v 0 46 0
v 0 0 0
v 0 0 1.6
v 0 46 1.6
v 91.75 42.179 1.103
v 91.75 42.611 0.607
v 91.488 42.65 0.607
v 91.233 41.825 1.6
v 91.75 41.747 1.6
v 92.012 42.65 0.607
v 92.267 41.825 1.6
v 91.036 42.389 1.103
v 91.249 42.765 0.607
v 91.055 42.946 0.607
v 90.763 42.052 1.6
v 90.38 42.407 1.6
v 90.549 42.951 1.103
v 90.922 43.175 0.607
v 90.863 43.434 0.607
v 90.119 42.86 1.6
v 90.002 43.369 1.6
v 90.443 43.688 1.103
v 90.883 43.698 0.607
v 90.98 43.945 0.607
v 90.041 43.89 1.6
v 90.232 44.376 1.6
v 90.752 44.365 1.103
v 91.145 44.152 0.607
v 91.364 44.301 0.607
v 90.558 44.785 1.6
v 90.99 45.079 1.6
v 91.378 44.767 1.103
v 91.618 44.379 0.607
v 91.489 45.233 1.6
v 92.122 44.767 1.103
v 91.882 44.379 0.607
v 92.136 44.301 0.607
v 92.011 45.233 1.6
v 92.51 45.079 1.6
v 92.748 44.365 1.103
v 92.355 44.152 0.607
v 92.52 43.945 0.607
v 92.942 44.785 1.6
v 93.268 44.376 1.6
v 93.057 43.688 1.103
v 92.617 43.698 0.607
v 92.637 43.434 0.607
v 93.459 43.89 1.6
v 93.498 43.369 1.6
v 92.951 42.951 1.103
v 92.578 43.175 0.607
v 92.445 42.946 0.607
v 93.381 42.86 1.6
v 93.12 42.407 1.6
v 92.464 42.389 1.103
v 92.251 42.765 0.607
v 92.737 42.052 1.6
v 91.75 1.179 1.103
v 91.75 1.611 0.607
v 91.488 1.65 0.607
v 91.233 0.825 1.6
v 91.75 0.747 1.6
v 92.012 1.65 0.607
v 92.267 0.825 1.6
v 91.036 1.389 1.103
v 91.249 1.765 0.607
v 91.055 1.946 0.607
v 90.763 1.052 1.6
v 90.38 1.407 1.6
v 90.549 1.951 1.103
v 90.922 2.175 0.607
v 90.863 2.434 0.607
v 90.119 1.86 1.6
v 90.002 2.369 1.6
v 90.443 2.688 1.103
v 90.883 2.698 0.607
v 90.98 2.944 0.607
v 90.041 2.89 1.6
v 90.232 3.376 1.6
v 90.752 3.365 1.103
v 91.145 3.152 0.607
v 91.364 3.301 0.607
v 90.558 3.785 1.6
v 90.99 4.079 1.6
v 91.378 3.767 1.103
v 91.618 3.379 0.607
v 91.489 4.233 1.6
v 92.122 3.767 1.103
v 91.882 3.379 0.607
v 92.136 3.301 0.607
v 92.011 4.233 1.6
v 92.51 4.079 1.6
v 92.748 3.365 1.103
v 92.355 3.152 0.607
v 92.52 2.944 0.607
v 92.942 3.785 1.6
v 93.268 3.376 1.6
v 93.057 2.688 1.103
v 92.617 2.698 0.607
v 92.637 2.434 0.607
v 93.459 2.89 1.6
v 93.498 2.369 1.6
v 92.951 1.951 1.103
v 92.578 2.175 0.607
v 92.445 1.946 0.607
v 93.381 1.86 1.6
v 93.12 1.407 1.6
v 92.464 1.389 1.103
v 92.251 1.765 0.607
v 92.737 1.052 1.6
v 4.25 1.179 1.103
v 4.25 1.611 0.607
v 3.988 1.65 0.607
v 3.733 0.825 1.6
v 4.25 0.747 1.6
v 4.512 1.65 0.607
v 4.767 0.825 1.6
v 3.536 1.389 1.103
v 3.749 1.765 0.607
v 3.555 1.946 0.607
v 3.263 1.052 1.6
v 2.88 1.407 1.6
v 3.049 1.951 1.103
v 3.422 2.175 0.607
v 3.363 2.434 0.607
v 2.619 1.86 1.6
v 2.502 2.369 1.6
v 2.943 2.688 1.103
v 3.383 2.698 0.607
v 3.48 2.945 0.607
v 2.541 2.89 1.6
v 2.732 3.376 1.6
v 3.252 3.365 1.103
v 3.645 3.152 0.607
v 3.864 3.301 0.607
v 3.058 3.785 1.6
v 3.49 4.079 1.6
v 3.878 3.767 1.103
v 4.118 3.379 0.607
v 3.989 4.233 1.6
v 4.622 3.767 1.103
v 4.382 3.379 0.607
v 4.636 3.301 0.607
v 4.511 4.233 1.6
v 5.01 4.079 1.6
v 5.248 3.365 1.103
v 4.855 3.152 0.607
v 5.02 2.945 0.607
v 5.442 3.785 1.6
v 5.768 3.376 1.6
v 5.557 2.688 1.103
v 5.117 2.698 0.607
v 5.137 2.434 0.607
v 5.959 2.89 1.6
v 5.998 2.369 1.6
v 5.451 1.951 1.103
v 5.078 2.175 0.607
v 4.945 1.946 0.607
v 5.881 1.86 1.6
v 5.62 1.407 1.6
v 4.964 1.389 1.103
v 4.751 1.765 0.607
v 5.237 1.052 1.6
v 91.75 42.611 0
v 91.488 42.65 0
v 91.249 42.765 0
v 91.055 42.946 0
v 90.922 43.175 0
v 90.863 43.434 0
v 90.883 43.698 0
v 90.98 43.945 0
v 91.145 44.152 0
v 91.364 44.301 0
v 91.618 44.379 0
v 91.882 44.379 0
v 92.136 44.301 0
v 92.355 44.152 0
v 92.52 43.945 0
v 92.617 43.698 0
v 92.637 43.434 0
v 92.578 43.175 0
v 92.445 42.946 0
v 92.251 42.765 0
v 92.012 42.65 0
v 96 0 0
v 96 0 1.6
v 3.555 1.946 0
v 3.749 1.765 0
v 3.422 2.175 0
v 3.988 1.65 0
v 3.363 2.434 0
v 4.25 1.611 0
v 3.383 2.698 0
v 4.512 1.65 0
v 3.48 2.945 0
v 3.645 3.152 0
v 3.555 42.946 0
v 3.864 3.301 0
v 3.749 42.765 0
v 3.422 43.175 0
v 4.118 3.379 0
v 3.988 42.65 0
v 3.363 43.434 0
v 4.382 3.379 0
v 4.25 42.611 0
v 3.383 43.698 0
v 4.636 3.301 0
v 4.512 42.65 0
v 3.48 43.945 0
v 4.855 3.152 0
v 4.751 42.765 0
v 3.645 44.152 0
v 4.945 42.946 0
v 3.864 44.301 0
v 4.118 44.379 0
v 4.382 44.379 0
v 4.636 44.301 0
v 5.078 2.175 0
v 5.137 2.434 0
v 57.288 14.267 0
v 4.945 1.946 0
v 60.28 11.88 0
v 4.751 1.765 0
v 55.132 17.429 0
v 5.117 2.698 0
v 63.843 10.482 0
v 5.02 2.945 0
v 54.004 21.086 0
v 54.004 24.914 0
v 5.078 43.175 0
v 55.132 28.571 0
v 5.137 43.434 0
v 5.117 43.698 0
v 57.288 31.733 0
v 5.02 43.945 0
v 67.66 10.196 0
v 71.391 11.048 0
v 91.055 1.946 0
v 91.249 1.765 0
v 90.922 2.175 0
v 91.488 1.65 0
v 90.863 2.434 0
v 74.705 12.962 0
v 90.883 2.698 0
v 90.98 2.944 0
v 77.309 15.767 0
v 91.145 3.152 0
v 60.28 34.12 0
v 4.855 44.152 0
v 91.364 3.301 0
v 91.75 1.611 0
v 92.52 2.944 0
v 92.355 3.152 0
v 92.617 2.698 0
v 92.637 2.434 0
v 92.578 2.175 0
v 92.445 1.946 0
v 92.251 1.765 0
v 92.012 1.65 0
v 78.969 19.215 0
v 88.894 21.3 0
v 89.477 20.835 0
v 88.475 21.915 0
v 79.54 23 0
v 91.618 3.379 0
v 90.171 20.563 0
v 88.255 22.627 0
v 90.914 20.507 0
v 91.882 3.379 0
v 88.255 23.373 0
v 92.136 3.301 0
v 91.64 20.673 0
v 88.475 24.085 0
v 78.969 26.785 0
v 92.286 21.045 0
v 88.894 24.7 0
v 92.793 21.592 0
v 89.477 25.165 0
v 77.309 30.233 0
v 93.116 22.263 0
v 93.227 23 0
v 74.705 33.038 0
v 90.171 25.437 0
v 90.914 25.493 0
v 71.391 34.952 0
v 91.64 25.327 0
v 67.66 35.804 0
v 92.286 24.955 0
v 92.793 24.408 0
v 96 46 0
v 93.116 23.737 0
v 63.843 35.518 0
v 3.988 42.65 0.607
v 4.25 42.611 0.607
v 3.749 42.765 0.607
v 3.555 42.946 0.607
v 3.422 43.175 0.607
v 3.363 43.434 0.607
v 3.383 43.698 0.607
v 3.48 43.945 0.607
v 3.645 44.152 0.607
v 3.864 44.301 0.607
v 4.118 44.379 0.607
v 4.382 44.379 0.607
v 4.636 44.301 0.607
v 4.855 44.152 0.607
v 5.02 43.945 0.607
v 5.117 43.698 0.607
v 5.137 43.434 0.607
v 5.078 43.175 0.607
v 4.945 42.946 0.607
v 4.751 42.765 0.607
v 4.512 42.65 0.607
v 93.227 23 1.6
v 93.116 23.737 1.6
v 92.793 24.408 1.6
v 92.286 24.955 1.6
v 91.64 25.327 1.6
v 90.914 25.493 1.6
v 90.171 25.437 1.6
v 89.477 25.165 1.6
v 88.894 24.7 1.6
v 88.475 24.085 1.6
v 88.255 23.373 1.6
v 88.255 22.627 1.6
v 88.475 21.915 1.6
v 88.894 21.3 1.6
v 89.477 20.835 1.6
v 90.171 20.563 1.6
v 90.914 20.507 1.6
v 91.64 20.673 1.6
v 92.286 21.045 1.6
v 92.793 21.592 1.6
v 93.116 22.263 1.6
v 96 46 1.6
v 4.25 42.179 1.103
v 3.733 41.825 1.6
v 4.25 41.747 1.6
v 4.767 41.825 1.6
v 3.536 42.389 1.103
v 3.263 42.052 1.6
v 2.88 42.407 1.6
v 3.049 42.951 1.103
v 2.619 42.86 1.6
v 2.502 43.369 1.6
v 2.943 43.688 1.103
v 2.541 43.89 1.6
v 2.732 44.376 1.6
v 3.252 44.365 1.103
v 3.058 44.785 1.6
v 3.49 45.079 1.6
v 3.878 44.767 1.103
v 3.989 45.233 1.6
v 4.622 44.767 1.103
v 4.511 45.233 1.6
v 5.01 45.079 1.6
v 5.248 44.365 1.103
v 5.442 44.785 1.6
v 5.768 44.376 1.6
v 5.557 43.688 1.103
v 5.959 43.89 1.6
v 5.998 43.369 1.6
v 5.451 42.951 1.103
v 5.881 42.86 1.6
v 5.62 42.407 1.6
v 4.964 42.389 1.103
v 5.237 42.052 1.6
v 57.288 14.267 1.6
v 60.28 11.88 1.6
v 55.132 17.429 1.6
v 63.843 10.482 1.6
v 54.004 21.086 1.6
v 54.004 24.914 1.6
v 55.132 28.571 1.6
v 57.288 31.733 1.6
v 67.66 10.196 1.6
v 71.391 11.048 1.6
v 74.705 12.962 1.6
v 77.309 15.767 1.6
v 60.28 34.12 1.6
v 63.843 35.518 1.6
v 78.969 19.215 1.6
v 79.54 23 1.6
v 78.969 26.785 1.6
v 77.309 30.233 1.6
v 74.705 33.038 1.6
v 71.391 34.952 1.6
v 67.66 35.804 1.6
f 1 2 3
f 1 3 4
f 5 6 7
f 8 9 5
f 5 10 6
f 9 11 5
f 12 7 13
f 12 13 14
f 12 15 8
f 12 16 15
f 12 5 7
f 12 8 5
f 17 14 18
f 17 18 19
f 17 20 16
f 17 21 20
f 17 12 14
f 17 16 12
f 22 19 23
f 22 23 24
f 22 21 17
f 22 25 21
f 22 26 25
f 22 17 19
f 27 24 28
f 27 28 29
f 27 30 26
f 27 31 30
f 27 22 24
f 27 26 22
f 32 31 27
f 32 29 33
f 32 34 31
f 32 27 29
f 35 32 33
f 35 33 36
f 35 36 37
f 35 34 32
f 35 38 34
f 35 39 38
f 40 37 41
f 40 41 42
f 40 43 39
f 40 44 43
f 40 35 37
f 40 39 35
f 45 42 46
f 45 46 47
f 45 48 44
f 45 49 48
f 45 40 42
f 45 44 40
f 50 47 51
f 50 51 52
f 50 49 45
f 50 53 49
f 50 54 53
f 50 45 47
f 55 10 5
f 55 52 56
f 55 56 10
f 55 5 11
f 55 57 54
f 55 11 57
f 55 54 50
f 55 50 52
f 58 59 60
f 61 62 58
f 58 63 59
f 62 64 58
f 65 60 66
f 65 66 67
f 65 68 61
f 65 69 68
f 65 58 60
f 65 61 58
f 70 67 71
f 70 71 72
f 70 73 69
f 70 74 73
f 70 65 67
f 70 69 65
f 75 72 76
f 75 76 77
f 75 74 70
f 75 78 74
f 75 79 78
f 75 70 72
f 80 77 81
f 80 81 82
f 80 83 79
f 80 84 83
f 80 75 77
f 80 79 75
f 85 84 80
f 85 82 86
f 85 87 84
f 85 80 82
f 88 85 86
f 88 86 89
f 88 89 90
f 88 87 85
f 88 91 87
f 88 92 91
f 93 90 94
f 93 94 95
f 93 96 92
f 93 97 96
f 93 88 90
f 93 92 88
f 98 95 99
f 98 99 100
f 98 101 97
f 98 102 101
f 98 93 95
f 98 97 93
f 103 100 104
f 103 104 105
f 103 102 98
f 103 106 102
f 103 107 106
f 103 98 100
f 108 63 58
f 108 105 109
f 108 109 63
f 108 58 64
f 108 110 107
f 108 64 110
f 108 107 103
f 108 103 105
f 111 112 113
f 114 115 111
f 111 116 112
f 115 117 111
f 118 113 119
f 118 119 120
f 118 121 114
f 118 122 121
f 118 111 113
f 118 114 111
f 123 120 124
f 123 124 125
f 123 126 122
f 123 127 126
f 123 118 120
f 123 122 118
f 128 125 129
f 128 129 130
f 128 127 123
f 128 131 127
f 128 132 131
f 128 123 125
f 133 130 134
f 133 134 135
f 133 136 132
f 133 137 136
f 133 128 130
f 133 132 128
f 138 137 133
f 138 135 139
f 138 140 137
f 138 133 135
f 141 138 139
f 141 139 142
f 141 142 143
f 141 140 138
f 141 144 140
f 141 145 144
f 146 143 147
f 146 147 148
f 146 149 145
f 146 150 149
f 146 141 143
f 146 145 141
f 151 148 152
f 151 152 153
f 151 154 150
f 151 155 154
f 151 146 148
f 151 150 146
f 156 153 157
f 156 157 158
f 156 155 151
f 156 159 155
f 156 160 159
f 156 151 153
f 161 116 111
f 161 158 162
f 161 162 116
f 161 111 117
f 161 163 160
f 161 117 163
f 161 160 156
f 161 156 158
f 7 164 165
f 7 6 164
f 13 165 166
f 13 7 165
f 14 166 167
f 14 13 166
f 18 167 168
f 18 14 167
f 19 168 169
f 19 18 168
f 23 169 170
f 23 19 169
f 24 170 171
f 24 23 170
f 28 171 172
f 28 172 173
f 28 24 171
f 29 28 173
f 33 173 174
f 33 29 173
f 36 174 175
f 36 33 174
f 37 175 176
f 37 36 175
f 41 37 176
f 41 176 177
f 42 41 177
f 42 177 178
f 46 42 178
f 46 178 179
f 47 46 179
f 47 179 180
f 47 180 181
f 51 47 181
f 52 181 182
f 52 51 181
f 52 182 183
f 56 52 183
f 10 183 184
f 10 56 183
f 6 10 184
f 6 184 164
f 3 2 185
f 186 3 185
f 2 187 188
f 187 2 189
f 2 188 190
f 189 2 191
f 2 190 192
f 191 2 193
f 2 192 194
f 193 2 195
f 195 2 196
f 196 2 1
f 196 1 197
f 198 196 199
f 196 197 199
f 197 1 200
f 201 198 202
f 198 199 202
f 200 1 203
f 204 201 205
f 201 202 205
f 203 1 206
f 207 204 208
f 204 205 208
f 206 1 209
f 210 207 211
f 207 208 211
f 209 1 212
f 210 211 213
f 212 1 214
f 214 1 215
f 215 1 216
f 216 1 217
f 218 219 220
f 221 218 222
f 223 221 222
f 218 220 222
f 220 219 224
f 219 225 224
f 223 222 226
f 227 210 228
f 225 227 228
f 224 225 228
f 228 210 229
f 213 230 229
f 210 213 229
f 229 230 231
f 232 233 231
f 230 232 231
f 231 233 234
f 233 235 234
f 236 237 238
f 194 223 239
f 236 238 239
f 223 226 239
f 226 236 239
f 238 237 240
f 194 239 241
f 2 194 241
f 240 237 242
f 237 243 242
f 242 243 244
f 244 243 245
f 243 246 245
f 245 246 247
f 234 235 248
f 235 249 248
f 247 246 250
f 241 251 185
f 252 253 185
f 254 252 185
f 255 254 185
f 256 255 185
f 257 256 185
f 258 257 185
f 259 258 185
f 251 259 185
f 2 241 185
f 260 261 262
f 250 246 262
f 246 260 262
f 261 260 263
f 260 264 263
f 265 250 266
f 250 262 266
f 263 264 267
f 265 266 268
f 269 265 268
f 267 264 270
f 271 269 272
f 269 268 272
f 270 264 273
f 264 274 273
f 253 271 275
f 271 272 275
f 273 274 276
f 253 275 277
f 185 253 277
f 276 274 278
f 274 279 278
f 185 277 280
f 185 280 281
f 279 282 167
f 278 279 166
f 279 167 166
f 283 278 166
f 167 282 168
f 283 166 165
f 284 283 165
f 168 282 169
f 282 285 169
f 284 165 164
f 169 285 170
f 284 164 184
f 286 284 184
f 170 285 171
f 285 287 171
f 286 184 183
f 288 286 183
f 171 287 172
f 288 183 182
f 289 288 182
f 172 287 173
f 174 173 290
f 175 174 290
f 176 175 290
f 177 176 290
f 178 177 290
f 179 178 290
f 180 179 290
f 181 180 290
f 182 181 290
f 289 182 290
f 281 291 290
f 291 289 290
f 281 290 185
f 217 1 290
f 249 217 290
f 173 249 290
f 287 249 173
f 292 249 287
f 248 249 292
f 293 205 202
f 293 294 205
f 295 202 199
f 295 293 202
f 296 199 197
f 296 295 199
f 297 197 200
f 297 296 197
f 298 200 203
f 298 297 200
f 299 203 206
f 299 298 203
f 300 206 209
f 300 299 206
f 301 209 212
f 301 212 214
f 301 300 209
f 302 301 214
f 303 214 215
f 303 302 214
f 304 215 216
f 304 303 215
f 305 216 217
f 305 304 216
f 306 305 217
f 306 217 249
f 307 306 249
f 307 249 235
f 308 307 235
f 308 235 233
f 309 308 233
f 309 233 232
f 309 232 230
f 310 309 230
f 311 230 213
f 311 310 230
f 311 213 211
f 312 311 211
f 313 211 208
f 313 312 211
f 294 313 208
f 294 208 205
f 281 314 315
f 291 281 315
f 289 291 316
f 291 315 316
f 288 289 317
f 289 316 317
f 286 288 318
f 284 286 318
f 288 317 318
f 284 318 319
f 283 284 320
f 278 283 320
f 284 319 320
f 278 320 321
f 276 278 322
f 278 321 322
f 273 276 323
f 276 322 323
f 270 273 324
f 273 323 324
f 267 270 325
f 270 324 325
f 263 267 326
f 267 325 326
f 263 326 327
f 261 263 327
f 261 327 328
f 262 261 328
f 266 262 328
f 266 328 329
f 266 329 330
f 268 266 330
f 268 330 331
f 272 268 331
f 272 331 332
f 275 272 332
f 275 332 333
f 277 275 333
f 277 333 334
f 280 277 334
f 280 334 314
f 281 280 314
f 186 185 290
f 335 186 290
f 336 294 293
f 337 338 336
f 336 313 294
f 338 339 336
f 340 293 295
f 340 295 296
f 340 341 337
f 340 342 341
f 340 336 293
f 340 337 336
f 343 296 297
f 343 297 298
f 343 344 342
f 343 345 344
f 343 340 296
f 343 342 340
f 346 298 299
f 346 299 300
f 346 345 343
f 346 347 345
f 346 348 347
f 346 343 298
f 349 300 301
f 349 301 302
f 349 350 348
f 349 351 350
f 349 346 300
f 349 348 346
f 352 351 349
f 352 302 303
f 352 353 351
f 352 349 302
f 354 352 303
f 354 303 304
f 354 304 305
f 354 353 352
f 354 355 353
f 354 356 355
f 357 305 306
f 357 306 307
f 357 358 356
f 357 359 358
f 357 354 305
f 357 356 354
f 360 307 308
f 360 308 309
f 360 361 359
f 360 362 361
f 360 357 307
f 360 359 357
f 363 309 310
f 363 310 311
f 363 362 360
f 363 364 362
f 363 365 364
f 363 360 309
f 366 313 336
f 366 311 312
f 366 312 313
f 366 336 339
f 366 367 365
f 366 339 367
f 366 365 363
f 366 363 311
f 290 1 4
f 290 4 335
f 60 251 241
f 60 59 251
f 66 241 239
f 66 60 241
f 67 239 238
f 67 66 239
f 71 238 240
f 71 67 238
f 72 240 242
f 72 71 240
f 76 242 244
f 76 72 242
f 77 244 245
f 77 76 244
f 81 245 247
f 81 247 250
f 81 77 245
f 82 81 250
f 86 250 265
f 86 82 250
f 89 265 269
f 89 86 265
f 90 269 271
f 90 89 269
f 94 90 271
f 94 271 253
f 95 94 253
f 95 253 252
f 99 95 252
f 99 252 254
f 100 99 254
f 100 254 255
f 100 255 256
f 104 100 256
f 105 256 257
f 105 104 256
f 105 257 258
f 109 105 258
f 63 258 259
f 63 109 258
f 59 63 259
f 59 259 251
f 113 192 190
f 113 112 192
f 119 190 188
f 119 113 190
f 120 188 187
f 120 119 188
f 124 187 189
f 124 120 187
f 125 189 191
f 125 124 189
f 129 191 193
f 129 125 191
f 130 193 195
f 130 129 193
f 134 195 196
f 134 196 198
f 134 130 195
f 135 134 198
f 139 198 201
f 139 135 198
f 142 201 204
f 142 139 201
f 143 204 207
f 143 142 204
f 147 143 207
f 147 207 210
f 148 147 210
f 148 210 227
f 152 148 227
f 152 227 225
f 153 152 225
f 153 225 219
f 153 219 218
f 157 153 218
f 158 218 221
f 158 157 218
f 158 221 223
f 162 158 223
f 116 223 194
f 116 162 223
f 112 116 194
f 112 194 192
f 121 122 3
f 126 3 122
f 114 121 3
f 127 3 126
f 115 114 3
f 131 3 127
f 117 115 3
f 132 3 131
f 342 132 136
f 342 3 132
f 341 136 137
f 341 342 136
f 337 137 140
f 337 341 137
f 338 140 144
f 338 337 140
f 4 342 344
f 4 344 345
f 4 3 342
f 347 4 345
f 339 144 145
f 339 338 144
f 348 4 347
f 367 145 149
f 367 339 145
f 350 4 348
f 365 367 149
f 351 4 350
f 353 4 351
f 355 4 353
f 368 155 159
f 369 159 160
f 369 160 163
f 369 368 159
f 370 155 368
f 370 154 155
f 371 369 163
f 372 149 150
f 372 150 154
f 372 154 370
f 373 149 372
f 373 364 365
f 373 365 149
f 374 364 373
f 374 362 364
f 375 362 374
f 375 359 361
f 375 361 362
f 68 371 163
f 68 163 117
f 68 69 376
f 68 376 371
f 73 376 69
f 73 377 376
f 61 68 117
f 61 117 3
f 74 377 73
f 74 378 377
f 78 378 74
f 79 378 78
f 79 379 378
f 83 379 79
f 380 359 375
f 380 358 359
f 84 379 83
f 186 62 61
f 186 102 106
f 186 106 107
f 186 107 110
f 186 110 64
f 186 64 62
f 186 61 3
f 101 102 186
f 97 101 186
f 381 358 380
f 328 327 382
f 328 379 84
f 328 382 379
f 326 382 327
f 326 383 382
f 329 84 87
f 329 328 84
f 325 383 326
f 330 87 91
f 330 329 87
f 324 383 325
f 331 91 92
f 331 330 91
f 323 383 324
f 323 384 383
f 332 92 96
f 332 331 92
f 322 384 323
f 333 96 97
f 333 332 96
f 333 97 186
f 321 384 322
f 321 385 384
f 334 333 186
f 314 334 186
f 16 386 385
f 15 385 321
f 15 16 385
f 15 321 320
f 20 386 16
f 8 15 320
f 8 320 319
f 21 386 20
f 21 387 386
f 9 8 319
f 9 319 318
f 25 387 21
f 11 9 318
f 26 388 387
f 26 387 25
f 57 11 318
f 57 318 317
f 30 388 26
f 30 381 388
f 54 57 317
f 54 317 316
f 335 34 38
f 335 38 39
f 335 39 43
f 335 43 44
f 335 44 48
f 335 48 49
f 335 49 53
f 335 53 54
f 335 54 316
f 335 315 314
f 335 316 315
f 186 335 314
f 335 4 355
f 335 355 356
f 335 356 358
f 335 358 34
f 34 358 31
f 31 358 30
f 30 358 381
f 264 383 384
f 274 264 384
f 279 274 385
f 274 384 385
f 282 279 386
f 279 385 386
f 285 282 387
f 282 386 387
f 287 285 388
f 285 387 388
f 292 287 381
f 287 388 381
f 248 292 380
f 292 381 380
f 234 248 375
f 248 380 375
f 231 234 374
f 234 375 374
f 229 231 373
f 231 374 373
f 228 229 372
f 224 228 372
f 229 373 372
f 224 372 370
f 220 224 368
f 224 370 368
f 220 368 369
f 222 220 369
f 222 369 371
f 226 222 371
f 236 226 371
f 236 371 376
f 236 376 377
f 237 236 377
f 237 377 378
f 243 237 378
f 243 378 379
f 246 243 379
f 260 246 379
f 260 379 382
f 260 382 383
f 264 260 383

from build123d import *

# Parameters (mm, degrees)
SKETCH1_W                                     = 96
SKETCH1_H                                     = 46
BOSS_EXTRUDE1_DEPTH                           = 1.6002
SKETCH2_R                                     = 12.8397
CUT_EXTRUDE1_DEPTH                            = 2.6002
CSK_FOR_0_FLAT_HEAD_SOCKET_CAP_SCREW1_A_COUNT = 2
CSK_FOR_0_FLAT_HEAD_SOCKET_CAP_SCREW1_A_PITCH = 41
CSK_FOR_0_FLAT_HEAD_SOCKET_CAP_SCRE_2_COUNT   = 2
CSK_FOR_0_FLAT_HEAD_SOCKET_CAP_SCRE_2_PITCH   = 96.629446858
CSK_FOR_0_FLAT_HEAD_SOCKET_CAP_SCRE_3_COUNT   = 2
CSK_FOR_0_FLAT_HEAD_SOCKET_CAP_SCRE_3_PITCH   = 87.5
SKETCH14_R                                    = 2.5
CUT_EXTRUDE2_DEPTH                            = 10


with BuildPart() as part:
    # Sketch1 → Boss-Extrude1 (new body)
    with BuildSketch(Plane.XY):
        with Locations((48, 23)):
            Rectangle(SKETCH1_W, SKETCH1_H)
    extrude(amount=BOSS_EXTRUDE1_DEPTH)

    # Sketch2 → Cut-Extrude1 (cut, through all)
    with BuildSketch(Plane.XY.offset(1.6002)):
        with Locations((66.7, 23)):
            Circle(SKETCH2_R)
    extrude(amount=-CUT_EXTRUDE1_DEPTH, mode=Mode.SUBTRACT)

    # Sketch7 → CSK for #0 Flat Head Socket Cap Screw1 (revolve, cut)
    with BuildSketch(Plane(origin=(4.25, 43.5, 1.6002), x_dir=(0, -1, 0), z_dir=(1, 0, 0))):
        Polygon((0, 0), (0, 1.6002), (0.889, 1.6002), (0.889, 0.993458156), (1.7526, 0), align=None)
    csk_for_0_flat_head_socket_cap_screw1 = revolve(axis=Axis((4.25, 43.5, 7.9502), (0, 0, -1)), mode=Mode.SUBTRACT)

    # CSK for #0 Flat Head Socket Cap Screw1 a: CSK for #0 Flat Head Socket Cap Screw1 ×2
    with Locations(*[(0, -i * CSK_FOR_0_FLAT_HEAD_SOCKET_CAP_SCREW1_A_PITCH, 0) for i in range(1, CSK_FOR_0_FLAT_HEAD_SOCKET_CAP_SCREW1_A_COUNT)]):
        add(csk_for_0_flat_head_socket_cap_screw1, mode=Mode.SUBTRACT)

    # CSK for _0 Flat Head Socket Cap Scre 2: CSK for #0 Flat Head Socket Cap Screw1 ×2
    with Locations(*[Vector(0.905521069, -0.424301301, 0) * (i * CSK_FOR_0_FLAT_HEAD_SOCKET_CAP_SCRE_2_PITCH) for i in range(1, CSK_FOR_0_FLAT_HEAD_SOCKET_CAP_SCRE_2_COUNT)]):
        add(csk_for_0_flat_head_socket_cap_screw1, mode=Mode.SUBTRACT)

    # CSK for _0 Flat Head Socket Cap Scre 3: CSK for #0 Flat Head Socket Cap Screw1 ×2
    with Locations(*[(i * CSK_FOR_0_FLAT_HEAD_SOCKET_CAP_SCRE_3_PITCH, 0, 0) for i in range(1, CSK_FOR_0_FLAT_HEAD_SOCKET_CAP_SCRE_3_COUNT)]):
        add(csk_for_0_flat_head_socket_cap_screw1, mode=Mode.SUBTRACT)

    # Sketch14 → Cut-Extrude2 (cut)
    with BuildSketch(Plane.XY.offset(1.6002)):
        with Locations((90.727040544, 23)):
            Circle(SKETCH14_R)
    extrude(amount=-CUT_EXTRUDE2_DEPTH, mode=Mode.SUBTRACT)


solid = part.part
